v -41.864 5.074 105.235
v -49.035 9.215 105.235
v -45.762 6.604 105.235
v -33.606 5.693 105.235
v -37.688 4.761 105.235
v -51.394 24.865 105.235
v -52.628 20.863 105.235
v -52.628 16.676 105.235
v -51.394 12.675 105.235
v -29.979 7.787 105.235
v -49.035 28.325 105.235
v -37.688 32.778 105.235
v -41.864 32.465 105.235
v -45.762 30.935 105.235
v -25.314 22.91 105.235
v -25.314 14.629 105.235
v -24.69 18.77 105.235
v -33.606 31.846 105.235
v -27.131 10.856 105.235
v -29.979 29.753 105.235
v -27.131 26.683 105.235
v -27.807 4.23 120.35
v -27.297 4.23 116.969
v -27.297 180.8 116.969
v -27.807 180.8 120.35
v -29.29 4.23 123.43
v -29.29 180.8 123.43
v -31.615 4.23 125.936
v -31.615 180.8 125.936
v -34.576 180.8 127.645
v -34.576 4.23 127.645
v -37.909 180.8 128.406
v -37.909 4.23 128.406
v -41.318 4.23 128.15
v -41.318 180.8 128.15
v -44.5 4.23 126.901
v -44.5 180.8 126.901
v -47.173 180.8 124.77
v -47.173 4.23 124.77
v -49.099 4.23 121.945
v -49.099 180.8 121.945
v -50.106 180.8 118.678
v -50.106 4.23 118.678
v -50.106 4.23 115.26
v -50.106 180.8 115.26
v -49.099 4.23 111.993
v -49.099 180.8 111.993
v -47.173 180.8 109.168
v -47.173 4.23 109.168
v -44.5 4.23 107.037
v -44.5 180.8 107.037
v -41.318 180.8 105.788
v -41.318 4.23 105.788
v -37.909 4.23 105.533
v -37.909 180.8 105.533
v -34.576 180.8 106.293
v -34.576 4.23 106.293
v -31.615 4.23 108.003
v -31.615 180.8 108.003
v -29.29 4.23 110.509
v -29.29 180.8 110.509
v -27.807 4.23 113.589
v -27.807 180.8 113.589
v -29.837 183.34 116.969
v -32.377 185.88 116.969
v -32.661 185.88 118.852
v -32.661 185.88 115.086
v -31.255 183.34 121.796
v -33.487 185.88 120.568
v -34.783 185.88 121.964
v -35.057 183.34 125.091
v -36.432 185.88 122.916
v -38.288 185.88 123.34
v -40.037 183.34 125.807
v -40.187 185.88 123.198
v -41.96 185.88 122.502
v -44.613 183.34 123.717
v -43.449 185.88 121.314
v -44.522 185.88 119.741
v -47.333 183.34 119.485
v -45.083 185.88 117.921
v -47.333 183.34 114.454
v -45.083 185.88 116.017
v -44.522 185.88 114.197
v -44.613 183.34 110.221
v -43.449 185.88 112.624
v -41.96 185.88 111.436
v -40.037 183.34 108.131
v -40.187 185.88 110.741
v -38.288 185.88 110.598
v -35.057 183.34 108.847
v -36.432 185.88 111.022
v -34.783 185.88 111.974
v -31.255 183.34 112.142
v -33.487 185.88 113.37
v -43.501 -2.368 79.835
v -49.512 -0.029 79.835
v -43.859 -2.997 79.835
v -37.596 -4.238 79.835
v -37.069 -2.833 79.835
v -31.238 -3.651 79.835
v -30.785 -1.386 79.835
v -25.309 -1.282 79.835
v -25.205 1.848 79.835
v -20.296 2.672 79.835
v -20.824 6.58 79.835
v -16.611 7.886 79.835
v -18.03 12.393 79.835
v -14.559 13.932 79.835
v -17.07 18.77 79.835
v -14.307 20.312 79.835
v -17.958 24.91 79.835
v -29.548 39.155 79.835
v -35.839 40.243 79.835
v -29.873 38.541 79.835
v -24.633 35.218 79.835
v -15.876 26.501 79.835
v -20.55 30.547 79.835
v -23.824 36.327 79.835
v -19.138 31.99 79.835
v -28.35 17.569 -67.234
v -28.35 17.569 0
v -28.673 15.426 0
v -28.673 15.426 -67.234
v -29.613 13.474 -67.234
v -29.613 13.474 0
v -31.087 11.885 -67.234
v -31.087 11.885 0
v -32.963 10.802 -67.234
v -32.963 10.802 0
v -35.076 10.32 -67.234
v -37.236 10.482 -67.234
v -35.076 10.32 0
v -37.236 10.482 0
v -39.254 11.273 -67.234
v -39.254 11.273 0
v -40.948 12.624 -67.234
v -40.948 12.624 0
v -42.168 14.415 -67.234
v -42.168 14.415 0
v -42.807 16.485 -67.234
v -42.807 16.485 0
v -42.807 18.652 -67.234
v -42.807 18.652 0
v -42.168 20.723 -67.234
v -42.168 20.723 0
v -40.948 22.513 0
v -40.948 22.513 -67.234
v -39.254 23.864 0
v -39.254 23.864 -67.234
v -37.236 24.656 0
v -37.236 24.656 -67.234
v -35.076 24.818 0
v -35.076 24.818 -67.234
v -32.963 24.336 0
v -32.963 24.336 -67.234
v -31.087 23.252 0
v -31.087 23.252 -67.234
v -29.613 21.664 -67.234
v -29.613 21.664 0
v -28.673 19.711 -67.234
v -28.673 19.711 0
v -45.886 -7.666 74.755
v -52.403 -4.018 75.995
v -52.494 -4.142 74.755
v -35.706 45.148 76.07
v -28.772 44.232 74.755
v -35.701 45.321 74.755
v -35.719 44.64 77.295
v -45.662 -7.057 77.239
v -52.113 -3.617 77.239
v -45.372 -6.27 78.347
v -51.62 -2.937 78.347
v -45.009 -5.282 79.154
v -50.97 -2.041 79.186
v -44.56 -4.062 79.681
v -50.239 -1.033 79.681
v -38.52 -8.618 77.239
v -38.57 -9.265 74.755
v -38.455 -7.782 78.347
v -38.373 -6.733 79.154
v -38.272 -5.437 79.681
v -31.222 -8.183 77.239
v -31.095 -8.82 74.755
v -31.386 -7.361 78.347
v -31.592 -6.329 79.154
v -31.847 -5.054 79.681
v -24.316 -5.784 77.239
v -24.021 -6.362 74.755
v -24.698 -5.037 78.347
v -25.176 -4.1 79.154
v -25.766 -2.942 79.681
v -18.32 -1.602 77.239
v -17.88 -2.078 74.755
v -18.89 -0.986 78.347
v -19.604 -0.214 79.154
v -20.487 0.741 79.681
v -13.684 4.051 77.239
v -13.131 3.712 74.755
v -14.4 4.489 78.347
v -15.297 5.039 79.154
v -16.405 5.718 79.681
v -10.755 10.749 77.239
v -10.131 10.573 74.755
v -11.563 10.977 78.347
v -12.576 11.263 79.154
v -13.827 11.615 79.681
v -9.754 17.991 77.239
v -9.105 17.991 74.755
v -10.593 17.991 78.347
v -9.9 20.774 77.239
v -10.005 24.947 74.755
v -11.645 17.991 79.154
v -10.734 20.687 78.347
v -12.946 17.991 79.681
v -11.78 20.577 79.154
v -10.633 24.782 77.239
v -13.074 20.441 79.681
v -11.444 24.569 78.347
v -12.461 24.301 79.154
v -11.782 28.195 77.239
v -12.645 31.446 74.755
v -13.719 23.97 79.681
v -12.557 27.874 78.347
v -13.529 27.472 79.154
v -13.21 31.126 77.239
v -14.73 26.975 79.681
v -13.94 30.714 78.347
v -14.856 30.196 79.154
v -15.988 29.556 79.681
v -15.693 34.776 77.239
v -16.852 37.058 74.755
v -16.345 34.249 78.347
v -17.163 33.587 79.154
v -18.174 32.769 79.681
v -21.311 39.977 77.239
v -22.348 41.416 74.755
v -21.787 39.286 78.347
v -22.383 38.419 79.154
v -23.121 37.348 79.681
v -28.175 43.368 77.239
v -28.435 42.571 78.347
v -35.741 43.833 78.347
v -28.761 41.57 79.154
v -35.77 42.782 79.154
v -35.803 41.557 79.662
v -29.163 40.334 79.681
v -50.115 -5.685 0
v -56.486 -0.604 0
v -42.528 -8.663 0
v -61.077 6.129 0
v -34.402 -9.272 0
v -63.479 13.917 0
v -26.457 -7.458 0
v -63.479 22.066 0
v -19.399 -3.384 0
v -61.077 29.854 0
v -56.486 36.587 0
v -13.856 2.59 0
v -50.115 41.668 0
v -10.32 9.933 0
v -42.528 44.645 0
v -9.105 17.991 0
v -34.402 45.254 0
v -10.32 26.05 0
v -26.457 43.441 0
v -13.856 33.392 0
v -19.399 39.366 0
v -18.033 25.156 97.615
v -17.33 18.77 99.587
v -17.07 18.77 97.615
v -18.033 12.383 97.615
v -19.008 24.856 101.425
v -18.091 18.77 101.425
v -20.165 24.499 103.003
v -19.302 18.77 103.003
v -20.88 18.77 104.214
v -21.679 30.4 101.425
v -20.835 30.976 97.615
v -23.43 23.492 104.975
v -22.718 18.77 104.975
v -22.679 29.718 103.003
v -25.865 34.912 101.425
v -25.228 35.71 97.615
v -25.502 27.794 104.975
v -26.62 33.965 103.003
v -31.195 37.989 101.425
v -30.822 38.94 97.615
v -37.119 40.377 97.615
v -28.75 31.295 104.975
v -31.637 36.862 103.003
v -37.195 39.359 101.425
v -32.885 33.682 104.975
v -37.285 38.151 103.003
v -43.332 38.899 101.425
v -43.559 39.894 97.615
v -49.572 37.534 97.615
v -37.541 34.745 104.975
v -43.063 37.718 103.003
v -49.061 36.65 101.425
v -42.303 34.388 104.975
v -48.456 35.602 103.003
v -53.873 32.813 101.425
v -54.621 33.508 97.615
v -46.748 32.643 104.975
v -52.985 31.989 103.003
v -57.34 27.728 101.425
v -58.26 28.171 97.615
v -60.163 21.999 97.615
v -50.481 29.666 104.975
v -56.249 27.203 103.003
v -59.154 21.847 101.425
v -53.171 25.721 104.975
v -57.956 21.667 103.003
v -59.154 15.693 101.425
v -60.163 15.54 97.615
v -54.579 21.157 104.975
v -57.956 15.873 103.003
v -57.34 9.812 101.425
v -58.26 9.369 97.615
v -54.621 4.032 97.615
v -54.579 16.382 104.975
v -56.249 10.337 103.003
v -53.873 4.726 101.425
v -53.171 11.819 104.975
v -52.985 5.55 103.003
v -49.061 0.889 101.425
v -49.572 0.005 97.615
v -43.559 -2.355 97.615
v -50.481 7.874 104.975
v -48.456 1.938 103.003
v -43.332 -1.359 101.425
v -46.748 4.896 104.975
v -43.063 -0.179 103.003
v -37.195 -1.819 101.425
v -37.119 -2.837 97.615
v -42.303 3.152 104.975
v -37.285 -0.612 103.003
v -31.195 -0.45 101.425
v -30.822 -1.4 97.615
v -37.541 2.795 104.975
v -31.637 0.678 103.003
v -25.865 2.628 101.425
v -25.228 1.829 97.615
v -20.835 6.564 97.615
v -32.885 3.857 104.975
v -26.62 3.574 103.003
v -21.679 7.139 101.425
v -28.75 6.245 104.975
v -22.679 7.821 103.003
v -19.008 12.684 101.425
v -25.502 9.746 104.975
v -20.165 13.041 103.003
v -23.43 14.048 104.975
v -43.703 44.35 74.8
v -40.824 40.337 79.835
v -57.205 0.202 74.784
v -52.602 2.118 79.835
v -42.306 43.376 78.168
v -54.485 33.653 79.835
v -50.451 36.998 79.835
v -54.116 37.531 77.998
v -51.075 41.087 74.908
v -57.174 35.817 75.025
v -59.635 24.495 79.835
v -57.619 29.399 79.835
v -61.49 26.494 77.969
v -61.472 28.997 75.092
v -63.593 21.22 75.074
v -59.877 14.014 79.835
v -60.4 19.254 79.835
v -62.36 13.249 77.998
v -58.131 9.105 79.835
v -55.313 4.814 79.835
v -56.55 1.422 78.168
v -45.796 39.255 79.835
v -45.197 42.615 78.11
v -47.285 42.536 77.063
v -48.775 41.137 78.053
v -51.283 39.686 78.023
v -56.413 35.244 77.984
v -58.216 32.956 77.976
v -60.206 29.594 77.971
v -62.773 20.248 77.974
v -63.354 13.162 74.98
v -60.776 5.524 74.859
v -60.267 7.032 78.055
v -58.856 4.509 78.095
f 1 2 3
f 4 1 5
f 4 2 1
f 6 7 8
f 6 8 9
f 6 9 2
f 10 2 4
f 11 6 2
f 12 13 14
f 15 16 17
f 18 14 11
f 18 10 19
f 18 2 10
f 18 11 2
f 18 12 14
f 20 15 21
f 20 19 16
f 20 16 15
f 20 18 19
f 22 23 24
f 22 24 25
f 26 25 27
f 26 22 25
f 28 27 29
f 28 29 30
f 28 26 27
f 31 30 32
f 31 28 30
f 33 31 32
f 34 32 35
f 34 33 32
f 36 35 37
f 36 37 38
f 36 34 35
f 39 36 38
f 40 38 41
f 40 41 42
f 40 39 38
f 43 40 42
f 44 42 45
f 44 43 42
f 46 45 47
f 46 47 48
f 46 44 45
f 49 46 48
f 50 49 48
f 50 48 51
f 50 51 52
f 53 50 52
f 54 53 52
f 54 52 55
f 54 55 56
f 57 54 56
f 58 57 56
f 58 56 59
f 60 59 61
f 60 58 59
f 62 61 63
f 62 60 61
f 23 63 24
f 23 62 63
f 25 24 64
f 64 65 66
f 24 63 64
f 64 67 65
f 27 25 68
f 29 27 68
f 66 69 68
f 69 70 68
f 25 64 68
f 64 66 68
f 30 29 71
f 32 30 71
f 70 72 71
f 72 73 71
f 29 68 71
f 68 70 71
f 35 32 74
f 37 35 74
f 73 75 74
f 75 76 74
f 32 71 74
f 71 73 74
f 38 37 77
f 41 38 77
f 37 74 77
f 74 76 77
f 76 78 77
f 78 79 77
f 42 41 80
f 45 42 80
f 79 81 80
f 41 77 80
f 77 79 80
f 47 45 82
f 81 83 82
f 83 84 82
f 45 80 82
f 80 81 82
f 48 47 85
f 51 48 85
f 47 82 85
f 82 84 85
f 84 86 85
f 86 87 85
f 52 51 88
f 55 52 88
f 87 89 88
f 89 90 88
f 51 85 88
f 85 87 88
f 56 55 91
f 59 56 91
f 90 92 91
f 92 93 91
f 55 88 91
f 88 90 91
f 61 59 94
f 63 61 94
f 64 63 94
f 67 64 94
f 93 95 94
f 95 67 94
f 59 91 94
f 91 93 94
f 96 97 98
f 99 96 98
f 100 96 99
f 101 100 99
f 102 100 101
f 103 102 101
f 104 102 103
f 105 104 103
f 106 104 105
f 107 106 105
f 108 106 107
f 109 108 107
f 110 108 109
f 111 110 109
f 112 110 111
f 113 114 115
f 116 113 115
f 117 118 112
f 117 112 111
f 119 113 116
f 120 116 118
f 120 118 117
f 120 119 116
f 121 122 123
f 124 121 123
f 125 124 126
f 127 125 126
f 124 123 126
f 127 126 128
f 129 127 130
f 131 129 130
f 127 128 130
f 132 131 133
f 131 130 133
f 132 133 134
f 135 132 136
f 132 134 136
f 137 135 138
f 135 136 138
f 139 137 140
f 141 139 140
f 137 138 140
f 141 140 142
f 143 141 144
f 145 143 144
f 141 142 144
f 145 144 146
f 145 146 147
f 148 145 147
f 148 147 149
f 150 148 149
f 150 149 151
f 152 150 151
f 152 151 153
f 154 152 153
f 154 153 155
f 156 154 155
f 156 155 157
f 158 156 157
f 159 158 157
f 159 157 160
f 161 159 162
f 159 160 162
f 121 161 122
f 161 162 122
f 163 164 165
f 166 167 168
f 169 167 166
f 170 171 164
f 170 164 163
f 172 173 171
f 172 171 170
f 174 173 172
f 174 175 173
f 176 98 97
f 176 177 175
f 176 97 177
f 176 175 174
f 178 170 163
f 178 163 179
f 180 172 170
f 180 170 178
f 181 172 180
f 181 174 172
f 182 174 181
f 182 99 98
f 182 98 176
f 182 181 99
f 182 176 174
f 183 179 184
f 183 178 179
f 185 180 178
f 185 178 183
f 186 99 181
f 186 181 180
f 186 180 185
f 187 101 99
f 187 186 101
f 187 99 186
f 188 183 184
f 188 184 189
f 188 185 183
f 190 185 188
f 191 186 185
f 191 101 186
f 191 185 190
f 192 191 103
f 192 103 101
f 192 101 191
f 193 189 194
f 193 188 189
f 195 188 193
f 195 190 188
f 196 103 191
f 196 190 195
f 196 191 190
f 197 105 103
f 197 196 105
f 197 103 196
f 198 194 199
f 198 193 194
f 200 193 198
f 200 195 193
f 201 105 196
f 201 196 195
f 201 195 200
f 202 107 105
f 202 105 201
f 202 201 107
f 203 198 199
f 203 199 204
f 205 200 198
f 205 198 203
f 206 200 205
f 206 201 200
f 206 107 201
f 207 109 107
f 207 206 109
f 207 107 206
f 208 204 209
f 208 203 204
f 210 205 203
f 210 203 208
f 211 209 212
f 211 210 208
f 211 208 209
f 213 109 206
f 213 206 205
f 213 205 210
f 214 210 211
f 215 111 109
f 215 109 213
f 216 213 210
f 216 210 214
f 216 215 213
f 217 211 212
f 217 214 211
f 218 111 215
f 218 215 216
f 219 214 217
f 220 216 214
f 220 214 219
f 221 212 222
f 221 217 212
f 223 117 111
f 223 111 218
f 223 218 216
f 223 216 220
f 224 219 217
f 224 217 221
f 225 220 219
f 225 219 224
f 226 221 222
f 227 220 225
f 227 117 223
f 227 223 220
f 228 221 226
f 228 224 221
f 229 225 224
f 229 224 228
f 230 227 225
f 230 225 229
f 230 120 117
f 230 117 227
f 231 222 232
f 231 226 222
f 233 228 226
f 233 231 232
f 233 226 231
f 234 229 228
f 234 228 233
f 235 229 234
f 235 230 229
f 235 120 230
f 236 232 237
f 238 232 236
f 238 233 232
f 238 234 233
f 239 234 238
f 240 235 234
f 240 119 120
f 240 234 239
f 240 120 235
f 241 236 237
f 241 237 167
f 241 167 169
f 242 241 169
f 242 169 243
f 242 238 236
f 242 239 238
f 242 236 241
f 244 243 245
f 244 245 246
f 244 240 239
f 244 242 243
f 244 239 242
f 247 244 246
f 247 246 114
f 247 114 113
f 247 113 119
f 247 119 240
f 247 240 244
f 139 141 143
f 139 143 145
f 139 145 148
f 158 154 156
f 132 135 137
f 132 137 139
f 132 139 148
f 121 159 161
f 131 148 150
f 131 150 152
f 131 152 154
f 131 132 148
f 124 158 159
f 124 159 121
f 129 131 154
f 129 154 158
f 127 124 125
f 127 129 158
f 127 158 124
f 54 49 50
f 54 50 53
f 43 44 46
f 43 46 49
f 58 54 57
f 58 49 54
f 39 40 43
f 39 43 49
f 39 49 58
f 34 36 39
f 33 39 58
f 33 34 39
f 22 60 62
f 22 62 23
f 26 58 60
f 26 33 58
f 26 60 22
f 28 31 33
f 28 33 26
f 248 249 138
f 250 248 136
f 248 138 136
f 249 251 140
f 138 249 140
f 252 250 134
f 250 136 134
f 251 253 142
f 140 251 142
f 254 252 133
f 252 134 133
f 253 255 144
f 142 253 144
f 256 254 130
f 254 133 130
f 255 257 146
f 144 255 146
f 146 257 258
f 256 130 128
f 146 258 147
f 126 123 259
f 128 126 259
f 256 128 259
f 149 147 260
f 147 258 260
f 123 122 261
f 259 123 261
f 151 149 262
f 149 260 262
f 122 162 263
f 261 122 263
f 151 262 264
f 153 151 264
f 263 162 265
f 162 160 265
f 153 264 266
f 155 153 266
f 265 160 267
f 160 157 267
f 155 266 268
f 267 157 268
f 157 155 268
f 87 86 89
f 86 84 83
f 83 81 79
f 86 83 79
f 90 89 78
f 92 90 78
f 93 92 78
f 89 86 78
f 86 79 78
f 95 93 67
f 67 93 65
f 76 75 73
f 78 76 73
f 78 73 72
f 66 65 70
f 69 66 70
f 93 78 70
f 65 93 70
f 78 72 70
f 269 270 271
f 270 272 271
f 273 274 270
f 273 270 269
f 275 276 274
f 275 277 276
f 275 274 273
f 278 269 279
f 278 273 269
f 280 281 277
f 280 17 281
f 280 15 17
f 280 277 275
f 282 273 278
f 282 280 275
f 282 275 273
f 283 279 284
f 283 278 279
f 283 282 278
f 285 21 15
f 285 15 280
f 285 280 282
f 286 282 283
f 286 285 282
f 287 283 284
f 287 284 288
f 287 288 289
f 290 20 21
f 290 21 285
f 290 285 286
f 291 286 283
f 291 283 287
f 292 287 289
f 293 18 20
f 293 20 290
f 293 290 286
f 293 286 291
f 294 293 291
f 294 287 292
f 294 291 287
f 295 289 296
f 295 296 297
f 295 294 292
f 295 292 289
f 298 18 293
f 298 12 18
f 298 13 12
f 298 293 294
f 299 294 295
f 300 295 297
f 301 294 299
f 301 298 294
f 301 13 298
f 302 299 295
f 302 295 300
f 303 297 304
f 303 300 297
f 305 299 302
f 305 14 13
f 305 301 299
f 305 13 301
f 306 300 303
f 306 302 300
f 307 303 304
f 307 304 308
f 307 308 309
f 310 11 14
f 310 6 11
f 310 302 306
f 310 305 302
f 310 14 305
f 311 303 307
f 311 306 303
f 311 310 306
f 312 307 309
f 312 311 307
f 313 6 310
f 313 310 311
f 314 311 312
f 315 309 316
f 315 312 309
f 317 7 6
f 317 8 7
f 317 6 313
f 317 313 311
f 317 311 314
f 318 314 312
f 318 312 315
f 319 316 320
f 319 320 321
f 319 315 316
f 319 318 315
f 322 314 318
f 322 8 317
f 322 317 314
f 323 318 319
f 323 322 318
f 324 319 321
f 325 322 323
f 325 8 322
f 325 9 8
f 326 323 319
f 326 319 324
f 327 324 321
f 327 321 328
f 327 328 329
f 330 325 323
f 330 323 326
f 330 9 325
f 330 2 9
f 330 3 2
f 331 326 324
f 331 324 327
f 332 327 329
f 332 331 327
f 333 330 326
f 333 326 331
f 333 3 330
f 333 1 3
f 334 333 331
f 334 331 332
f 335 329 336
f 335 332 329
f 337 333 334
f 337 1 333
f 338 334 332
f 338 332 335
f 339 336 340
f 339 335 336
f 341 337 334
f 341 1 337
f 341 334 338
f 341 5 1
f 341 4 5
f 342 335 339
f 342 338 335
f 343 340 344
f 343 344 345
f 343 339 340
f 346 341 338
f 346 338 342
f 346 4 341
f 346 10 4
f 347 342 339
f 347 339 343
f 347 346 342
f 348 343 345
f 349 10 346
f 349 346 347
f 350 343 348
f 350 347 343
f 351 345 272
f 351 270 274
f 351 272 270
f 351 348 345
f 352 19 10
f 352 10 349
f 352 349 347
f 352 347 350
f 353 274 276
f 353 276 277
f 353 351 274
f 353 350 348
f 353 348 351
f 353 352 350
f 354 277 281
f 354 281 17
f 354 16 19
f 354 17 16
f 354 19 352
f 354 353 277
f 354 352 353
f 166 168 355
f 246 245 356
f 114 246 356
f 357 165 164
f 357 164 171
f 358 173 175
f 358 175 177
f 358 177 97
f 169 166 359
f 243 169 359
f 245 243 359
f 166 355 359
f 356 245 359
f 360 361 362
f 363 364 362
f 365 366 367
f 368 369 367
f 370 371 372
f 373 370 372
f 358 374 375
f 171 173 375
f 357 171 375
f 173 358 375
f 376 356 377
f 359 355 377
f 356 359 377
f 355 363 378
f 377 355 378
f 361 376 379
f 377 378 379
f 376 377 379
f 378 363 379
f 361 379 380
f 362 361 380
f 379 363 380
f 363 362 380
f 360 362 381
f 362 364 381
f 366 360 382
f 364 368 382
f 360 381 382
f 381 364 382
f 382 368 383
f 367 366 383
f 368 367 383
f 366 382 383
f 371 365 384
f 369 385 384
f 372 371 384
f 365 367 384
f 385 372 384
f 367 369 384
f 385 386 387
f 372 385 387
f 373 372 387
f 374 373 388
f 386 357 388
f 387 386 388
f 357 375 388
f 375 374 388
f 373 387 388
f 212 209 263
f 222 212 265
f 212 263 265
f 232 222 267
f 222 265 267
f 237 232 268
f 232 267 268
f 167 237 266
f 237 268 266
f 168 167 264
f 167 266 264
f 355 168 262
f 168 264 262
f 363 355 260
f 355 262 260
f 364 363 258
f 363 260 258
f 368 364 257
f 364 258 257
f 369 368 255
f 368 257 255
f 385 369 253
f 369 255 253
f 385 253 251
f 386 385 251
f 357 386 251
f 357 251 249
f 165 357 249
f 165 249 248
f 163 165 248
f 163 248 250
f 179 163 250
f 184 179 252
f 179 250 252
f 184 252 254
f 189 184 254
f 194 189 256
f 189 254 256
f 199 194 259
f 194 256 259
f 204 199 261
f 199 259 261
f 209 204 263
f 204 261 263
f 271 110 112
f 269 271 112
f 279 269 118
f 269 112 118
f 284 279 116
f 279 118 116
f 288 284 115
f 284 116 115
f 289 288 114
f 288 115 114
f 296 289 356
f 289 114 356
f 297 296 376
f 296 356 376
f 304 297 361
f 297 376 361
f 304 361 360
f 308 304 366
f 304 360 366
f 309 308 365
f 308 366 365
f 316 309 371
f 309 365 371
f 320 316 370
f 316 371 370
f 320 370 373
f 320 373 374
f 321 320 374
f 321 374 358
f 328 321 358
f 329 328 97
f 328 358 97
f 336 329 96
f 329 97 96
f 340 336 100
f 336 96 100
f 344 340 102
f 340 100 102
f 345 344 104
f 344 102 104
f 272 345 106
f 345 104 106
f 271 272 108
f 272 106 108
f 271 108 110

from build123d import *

# Parameters (mm, degrees)
F0_R     = 27.3395312078
F1_DEPTH = 79.83503
F2_R     = 21.6676000415
F3_DEPTH = 25.4
F6_R     = 11.4685905788
F7_DEPTH = 181.65072
F8_R     = 7.2692434599
F9_DEPTH = 67.23363
F10_R    = 5.08
F11_R    = 7.62
F12_SIZE = 5.08


with BuildPart() as f1:
    # F0 (on Top) → F1 (new body)
    with BuildSketch(Plane.XY):
        with Locations((-36.4448577166, 17.9913379252)):
            Circle(F0_R)
    extrude(amount=F1_DEPTH)

    # F2 (on face) → F3 (join)
    with BuildSketch(Plane.XY.offset(79.83503)):
        with Locations((-38.7377776206, 18.7697913498)):
            Circle(F2_R)
    extrude(amount=F3_DEPTH)

    # F8 (on face) → F9 (join)
    with BuildSketch(Plane(origin=(0, 0, 0), x_dir=(1, 0, 0), z_dir=(0, 0, -1))):
        with Locations((-35.6188900769, -17.5687633455)):
            Circle(F8_R)
    extrude(amount=F9_DEPTH)

    # F10
    f10_edges = [f1.edges().sort_by_distance(p)[0] for p in [
        (-63.784389, 17.991338, 79.83503),
    ]]
    fillet(f10_edges, radius=F10_R)

    # F11
    f11_edges = [f1.edges().sort_by_distance(p)[0] for p in [
        (-60.405378, 18.769791, 105.23503),
    ]]
    fillet(f11_edges, radius=F11_R)


with BuildPart() as f7:
    # F6 (on face) → F7 (new body)
    with BuildSketch(Plane.XZ.offset(-4.2296172571)):
        with Locations((-38.7658327818, 116.9691085815)):
            Circle(F6_R)
    extrude(amount=-F7_DEPTH)

    # F12
    f12_edges = [f7.edges().sort_by_distance(p)[0] for p in [
        (-50.234423, 185.880337, 116.969109),
    ]]
    chamfer(f12_edges, length=F12_SIZE)


solid = Compound([f1.part, f7.part])
